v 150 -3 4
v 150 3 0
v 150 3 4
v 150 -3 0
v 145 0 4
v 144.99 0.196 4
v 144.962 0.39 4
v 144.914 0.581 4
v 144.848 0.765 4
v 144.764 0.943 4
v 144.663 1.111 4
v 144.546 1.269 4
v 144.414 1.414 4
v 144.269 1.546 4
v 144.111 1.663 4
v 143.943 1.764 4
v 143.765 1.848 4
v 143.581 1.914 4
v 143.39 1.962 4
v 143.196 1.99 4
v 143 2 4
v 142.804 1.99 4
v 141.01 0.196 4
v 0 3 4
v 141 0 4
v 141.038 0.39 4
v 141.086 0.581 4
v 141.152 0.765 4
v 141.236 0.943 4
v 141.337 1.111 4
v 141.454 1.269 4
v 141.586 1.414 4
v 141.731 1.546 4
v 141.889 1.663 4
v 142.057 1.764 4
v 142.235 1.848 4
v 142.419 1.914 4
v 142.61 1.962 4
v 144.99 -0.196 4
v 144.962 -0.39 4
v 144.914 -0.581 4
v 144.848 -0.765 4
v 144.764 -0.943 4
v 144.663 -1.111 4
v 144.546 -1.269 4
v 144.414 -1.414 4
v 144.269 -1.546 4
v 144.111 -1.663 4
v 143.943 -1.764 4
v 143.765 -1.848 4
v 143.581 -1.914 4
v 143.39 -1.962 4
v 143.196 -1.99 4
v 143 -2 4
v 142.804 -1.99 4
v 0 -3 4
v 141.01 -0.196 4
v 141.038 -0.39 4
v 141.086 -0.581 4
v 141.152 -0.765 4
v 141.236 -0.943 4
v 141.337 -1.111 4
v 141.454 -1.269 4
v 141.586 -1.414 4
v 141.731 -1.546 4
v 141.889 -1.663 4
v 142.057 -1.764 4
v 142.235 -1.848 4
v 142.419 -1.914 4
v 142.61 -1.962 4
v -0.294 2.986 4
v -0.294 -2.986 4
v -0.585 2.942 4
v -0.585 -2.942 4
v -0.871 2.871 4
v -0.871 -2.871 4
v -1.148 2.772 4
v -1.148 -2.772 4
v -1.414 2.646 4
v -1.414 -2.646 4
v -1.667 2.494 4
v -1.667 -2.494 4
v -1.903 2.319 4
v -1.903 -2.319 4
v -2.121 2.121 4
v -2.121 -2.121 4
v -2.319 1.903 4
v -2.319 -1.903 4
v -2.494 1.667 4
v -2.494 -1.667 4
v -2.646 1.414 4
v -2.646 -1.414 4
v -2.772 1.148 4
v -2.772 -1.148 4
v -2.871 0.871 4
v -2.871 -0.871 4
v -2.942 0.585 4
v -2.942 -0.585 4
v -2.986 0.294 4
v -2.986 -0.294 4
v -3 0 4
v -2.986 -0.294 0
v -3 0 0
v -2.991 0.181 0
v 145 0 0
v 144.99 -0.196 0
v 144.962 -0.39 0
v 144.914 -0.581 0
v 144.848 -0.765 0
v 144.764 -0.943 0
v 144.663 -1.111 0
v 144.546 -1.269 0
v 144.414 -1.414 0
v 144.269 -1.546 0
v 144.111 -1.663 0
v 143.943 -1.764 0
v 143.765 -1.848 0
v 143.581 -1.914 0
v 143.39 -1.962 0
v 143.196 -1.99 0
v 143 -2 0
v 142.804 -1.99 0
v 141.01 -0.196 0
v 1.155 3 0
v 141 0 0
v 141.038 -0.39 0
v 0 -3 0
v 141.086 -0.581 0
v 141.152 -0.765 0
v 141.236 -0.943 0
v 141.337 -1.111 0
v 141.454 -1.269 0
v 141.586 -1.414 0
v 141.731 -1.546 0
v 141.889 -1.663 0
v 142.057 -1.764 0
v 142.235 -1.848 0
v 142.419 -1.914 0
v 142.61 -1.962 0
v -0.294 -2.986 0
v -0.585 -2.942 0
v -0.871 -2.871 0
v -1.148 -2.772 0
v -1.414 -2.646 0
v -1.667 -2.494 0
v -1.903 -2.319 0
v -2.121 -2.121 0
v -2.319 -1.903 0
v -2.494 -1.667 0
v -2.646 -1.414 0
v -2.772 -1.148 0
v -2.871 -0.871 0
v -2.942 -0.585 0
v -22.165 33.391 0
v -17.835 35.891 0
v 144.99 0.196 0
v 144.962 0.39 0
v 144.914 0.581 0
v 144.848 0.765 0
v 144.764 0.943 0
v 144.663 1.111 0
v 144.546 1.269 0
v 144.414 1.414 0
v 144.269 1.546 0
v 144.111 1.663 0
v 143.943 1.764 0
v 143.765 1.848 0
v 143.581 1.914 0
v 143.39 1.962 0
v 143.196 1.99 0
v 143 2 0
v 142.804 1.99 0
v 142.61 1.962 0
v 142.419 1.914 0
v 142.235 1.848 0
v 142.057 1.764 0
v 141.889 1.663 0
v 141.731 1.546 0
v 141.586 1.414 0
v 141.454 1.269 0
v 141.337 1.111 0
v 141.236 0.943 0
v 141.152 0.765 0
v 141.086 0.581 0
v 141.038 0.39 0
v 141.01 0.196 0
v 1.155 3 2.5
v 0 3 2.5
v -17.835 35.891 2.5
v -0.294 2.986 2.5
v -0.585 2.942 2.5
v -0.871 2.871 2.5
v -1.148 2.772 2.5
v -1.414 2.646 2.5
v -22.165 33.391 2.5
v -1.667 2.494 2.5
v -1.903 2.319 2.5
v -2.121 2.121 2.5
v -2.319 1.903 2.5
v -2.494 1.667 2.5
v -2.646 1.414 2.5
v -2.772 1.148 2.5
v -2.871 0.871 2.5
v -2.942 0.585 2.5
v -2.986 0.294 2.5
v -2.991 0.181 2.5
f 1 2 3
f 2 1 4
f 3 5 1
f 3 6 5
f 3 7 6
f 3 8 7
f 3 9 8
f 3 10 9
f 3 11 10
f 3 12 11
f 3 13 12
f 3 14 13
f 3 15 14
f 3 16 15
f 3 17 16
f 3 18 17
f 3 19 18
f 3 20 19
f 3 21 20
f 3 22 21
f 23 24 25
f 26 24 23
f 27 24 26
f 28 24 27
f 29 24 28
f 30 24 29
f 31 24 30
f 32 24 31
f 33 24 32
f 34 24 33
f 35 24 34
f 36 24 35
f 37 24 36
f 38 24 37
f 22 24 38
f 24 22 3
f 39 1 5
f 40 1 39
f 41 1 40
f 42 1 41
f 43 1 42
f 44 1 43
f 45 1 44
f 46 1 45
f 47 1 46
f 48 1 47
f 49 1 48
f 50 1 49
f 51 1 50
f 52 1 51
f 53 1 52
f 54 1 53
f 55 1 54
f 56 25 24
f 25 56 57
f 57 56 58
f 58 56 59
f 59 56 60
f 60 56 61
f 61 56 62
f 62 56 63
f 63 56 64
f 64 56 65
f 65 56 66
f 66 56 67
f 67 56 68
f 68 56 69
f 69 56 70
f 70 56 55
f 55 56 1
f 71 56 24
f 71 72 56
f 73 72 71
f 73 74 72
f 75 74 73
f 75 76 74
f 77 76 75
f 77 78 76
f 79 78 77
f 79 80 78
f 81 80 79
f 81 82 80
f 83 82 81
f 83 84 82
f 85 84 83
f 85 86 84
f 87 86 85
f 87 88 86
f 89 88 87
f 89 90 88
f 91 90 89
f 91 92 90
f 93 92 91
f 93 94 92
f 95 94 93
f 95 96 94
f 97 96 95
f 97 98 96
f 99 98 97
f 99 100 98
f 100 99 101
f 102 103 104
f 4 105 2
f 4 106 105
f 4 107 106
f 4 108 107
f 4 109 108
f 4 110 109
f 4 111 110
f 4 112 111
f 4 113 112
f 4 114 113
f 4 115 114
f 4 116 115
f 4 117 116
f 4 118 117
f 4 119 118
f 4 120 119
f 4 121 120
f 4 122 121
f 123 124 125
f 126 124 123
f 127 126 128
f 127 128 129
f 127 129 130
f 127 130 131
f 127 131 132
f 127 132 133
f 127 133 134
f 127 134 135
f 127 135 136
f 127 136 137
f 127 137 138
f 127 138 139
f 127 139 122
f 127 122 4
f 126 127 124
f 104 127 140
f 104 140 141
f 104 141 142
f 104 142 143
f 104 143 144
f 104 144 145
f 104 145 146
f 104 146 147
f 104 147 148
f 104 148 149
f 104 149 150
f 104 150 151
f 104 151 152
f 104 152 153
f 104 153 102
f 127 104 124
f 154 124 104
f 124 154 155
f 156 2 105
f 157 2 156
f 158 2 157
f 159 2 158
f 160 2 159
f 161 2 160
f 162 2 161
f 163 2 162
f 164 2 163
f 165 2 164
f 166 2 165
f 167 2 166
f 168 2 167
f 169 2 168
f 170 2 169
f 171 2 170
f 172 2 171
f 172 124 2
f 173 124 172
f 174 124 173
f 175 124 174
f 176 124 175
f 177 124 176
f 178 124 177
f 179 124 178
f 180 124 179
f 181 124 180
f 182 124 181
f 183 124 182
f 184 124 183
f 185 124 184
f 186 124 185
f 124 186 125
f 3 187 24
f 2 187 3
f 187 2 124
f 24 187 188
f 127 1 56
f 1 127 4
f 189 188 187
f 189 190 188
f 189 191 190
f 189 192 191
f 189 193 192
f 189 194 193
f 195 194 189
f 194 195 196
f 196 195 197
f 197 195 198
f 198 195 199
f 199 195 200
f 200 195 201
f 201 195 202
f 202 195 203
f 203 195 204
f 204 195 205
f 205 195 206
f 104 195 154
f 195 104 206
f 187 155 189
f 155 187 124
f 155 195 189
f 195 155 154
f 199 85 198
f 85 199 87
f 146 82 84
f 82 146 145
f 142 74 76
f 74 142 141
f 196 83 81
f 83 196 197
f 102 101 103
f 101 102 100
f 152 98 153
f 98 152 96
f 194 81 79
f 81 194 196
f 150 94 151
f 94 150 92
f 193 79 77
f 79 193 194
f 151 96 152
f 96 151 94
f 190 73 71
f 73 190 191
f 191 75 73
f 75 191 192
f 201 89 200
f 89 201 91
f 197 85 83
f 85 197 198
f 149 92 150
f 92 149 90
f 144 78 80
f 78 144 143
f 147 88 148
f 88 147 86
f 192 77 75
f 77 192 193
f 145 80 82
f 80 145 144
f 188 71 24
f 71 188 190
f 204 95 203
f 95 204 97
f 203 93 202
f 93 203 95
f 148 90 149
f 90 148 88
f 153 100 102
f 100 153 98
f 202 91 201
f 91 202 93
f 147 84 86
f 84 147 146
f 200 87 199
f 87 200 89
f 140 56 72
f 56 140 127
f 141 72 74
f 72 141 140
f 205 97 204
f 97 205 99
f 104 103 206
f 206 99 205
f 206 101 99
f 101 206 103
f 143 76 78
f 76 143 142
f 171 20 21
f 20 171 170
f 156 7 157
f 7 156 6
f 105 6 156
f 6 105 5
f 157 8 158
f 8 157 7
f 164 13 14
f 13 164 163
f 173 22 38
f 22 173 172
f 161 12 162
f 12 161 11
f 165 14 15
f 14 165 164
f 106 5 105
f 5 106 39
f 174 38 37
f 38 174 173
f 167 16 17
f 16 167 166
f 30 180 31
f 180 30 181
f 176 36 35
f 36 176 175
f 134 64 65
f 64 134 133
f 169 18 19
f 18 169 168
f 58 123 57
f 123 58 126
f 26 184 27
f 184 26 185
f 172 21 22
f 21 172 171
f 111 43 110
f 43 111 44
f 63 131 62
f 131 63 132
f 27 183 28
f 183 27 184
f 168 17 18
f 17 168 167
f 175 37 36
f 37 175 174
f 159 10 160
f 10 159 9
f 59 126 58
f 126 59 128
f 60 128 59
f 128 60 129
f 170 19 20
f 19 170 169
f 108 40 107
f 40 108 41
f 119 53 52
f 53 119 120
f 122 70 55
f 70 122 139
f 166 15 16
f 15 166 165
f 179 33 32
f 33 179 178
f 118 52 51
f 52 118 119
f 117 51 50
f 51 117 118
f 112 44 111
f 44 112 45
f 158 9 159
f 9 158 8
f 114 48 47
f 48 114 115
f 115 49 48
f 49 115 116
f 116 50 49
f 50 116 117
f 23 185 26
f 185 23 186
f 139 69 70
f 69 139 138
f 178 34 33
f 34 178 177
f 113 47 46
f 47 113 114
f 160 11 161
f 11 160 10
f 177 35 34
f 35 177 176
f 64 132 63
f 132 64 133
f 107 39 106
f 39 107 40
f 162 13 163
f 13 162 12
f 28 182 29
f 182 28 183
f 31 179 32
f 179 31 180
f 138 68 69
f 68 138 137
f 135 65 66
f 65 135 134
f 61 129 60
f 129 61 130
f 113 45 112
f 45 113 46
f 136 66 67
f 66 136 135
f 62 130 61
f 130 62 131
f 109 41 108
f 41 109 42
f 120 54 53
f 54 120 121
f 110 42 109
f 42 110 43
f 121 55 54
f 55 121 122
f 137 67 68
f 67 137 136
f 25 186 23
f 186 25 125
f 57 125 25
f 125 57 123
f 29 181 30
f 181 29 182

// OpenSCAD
// L-shaped (hockey-stick) cell spreader for bacterial plating.
// Designed for FDM printing, lying flat on the XY plane.

// --- Dimensions ---
handle_l    = 150.0;  // Length of the handle bar
handle_w    = 6.0;    // Width of the handle bar
handle_t    = 4.0;    // Thickness of the handle bar
foot_l       = 40.0;  // Length of the spreading foot
foot_w      = 5.0;    // Width of the spreading foot
foot_t      = 2.5;    // Thickness of the spreading foot
boss_d      = 6.0;    // Diameter of the joining boss
boss_h      = 4.0;    // Height of the joining boss
hole_d      = 4.0;    // Diameter of the hanging hole
hole_x      = 143.0;  // X-position of the hanging hole
angle_deg   = 120.0;  // Angle of the foot relative to the handle (+X axis)

$fn = 64;

// --- Geometry Construction ---

module handle() {
    // Handle: x = 0 to 150, y = -3 to 3, z = 0 to 4
    // To achieve y = -3 to 3 with width 6, we translate by -width/2
    translate([0, -handle_w/2, 0])
    cube([handle_l, handle_w, handle_t]);
}

module foot() {
    // Foot: 40mm long, 5mm wide, 2.5mm thick.
    // Centerline starts at origin and points 120 degrees.
    // To ensure the centerline is the axis of rotation, 
    // we translate the cube so its Y-center is at 0.
    rotate([0, 0, angle_deg])
    translate([0, -foot_w/2, 0])
    cube([foot_l, foot_w, foot_t]);
}

module boss() {
    // Boss: 6mm diameter, 4mm tall at the origin.
    // Centered on X and Y.
    translate([0, 0, 0])
    cylinder(h = boss_h, d = boss_d);
}

// The final part uses difference to subtract the hole from the union of parts.
difference() {
    union() {
        handle();
        foot();
        boss();
    }
    
    // Hanging hole: 4mm diameter at x=143, y=0, through the handle.
    // We translate to the center of the handle's width (y=0).
    translate([hole_x, 0, -1])
    cylinder(h = handle_t + 2, d = hole_d);
}
